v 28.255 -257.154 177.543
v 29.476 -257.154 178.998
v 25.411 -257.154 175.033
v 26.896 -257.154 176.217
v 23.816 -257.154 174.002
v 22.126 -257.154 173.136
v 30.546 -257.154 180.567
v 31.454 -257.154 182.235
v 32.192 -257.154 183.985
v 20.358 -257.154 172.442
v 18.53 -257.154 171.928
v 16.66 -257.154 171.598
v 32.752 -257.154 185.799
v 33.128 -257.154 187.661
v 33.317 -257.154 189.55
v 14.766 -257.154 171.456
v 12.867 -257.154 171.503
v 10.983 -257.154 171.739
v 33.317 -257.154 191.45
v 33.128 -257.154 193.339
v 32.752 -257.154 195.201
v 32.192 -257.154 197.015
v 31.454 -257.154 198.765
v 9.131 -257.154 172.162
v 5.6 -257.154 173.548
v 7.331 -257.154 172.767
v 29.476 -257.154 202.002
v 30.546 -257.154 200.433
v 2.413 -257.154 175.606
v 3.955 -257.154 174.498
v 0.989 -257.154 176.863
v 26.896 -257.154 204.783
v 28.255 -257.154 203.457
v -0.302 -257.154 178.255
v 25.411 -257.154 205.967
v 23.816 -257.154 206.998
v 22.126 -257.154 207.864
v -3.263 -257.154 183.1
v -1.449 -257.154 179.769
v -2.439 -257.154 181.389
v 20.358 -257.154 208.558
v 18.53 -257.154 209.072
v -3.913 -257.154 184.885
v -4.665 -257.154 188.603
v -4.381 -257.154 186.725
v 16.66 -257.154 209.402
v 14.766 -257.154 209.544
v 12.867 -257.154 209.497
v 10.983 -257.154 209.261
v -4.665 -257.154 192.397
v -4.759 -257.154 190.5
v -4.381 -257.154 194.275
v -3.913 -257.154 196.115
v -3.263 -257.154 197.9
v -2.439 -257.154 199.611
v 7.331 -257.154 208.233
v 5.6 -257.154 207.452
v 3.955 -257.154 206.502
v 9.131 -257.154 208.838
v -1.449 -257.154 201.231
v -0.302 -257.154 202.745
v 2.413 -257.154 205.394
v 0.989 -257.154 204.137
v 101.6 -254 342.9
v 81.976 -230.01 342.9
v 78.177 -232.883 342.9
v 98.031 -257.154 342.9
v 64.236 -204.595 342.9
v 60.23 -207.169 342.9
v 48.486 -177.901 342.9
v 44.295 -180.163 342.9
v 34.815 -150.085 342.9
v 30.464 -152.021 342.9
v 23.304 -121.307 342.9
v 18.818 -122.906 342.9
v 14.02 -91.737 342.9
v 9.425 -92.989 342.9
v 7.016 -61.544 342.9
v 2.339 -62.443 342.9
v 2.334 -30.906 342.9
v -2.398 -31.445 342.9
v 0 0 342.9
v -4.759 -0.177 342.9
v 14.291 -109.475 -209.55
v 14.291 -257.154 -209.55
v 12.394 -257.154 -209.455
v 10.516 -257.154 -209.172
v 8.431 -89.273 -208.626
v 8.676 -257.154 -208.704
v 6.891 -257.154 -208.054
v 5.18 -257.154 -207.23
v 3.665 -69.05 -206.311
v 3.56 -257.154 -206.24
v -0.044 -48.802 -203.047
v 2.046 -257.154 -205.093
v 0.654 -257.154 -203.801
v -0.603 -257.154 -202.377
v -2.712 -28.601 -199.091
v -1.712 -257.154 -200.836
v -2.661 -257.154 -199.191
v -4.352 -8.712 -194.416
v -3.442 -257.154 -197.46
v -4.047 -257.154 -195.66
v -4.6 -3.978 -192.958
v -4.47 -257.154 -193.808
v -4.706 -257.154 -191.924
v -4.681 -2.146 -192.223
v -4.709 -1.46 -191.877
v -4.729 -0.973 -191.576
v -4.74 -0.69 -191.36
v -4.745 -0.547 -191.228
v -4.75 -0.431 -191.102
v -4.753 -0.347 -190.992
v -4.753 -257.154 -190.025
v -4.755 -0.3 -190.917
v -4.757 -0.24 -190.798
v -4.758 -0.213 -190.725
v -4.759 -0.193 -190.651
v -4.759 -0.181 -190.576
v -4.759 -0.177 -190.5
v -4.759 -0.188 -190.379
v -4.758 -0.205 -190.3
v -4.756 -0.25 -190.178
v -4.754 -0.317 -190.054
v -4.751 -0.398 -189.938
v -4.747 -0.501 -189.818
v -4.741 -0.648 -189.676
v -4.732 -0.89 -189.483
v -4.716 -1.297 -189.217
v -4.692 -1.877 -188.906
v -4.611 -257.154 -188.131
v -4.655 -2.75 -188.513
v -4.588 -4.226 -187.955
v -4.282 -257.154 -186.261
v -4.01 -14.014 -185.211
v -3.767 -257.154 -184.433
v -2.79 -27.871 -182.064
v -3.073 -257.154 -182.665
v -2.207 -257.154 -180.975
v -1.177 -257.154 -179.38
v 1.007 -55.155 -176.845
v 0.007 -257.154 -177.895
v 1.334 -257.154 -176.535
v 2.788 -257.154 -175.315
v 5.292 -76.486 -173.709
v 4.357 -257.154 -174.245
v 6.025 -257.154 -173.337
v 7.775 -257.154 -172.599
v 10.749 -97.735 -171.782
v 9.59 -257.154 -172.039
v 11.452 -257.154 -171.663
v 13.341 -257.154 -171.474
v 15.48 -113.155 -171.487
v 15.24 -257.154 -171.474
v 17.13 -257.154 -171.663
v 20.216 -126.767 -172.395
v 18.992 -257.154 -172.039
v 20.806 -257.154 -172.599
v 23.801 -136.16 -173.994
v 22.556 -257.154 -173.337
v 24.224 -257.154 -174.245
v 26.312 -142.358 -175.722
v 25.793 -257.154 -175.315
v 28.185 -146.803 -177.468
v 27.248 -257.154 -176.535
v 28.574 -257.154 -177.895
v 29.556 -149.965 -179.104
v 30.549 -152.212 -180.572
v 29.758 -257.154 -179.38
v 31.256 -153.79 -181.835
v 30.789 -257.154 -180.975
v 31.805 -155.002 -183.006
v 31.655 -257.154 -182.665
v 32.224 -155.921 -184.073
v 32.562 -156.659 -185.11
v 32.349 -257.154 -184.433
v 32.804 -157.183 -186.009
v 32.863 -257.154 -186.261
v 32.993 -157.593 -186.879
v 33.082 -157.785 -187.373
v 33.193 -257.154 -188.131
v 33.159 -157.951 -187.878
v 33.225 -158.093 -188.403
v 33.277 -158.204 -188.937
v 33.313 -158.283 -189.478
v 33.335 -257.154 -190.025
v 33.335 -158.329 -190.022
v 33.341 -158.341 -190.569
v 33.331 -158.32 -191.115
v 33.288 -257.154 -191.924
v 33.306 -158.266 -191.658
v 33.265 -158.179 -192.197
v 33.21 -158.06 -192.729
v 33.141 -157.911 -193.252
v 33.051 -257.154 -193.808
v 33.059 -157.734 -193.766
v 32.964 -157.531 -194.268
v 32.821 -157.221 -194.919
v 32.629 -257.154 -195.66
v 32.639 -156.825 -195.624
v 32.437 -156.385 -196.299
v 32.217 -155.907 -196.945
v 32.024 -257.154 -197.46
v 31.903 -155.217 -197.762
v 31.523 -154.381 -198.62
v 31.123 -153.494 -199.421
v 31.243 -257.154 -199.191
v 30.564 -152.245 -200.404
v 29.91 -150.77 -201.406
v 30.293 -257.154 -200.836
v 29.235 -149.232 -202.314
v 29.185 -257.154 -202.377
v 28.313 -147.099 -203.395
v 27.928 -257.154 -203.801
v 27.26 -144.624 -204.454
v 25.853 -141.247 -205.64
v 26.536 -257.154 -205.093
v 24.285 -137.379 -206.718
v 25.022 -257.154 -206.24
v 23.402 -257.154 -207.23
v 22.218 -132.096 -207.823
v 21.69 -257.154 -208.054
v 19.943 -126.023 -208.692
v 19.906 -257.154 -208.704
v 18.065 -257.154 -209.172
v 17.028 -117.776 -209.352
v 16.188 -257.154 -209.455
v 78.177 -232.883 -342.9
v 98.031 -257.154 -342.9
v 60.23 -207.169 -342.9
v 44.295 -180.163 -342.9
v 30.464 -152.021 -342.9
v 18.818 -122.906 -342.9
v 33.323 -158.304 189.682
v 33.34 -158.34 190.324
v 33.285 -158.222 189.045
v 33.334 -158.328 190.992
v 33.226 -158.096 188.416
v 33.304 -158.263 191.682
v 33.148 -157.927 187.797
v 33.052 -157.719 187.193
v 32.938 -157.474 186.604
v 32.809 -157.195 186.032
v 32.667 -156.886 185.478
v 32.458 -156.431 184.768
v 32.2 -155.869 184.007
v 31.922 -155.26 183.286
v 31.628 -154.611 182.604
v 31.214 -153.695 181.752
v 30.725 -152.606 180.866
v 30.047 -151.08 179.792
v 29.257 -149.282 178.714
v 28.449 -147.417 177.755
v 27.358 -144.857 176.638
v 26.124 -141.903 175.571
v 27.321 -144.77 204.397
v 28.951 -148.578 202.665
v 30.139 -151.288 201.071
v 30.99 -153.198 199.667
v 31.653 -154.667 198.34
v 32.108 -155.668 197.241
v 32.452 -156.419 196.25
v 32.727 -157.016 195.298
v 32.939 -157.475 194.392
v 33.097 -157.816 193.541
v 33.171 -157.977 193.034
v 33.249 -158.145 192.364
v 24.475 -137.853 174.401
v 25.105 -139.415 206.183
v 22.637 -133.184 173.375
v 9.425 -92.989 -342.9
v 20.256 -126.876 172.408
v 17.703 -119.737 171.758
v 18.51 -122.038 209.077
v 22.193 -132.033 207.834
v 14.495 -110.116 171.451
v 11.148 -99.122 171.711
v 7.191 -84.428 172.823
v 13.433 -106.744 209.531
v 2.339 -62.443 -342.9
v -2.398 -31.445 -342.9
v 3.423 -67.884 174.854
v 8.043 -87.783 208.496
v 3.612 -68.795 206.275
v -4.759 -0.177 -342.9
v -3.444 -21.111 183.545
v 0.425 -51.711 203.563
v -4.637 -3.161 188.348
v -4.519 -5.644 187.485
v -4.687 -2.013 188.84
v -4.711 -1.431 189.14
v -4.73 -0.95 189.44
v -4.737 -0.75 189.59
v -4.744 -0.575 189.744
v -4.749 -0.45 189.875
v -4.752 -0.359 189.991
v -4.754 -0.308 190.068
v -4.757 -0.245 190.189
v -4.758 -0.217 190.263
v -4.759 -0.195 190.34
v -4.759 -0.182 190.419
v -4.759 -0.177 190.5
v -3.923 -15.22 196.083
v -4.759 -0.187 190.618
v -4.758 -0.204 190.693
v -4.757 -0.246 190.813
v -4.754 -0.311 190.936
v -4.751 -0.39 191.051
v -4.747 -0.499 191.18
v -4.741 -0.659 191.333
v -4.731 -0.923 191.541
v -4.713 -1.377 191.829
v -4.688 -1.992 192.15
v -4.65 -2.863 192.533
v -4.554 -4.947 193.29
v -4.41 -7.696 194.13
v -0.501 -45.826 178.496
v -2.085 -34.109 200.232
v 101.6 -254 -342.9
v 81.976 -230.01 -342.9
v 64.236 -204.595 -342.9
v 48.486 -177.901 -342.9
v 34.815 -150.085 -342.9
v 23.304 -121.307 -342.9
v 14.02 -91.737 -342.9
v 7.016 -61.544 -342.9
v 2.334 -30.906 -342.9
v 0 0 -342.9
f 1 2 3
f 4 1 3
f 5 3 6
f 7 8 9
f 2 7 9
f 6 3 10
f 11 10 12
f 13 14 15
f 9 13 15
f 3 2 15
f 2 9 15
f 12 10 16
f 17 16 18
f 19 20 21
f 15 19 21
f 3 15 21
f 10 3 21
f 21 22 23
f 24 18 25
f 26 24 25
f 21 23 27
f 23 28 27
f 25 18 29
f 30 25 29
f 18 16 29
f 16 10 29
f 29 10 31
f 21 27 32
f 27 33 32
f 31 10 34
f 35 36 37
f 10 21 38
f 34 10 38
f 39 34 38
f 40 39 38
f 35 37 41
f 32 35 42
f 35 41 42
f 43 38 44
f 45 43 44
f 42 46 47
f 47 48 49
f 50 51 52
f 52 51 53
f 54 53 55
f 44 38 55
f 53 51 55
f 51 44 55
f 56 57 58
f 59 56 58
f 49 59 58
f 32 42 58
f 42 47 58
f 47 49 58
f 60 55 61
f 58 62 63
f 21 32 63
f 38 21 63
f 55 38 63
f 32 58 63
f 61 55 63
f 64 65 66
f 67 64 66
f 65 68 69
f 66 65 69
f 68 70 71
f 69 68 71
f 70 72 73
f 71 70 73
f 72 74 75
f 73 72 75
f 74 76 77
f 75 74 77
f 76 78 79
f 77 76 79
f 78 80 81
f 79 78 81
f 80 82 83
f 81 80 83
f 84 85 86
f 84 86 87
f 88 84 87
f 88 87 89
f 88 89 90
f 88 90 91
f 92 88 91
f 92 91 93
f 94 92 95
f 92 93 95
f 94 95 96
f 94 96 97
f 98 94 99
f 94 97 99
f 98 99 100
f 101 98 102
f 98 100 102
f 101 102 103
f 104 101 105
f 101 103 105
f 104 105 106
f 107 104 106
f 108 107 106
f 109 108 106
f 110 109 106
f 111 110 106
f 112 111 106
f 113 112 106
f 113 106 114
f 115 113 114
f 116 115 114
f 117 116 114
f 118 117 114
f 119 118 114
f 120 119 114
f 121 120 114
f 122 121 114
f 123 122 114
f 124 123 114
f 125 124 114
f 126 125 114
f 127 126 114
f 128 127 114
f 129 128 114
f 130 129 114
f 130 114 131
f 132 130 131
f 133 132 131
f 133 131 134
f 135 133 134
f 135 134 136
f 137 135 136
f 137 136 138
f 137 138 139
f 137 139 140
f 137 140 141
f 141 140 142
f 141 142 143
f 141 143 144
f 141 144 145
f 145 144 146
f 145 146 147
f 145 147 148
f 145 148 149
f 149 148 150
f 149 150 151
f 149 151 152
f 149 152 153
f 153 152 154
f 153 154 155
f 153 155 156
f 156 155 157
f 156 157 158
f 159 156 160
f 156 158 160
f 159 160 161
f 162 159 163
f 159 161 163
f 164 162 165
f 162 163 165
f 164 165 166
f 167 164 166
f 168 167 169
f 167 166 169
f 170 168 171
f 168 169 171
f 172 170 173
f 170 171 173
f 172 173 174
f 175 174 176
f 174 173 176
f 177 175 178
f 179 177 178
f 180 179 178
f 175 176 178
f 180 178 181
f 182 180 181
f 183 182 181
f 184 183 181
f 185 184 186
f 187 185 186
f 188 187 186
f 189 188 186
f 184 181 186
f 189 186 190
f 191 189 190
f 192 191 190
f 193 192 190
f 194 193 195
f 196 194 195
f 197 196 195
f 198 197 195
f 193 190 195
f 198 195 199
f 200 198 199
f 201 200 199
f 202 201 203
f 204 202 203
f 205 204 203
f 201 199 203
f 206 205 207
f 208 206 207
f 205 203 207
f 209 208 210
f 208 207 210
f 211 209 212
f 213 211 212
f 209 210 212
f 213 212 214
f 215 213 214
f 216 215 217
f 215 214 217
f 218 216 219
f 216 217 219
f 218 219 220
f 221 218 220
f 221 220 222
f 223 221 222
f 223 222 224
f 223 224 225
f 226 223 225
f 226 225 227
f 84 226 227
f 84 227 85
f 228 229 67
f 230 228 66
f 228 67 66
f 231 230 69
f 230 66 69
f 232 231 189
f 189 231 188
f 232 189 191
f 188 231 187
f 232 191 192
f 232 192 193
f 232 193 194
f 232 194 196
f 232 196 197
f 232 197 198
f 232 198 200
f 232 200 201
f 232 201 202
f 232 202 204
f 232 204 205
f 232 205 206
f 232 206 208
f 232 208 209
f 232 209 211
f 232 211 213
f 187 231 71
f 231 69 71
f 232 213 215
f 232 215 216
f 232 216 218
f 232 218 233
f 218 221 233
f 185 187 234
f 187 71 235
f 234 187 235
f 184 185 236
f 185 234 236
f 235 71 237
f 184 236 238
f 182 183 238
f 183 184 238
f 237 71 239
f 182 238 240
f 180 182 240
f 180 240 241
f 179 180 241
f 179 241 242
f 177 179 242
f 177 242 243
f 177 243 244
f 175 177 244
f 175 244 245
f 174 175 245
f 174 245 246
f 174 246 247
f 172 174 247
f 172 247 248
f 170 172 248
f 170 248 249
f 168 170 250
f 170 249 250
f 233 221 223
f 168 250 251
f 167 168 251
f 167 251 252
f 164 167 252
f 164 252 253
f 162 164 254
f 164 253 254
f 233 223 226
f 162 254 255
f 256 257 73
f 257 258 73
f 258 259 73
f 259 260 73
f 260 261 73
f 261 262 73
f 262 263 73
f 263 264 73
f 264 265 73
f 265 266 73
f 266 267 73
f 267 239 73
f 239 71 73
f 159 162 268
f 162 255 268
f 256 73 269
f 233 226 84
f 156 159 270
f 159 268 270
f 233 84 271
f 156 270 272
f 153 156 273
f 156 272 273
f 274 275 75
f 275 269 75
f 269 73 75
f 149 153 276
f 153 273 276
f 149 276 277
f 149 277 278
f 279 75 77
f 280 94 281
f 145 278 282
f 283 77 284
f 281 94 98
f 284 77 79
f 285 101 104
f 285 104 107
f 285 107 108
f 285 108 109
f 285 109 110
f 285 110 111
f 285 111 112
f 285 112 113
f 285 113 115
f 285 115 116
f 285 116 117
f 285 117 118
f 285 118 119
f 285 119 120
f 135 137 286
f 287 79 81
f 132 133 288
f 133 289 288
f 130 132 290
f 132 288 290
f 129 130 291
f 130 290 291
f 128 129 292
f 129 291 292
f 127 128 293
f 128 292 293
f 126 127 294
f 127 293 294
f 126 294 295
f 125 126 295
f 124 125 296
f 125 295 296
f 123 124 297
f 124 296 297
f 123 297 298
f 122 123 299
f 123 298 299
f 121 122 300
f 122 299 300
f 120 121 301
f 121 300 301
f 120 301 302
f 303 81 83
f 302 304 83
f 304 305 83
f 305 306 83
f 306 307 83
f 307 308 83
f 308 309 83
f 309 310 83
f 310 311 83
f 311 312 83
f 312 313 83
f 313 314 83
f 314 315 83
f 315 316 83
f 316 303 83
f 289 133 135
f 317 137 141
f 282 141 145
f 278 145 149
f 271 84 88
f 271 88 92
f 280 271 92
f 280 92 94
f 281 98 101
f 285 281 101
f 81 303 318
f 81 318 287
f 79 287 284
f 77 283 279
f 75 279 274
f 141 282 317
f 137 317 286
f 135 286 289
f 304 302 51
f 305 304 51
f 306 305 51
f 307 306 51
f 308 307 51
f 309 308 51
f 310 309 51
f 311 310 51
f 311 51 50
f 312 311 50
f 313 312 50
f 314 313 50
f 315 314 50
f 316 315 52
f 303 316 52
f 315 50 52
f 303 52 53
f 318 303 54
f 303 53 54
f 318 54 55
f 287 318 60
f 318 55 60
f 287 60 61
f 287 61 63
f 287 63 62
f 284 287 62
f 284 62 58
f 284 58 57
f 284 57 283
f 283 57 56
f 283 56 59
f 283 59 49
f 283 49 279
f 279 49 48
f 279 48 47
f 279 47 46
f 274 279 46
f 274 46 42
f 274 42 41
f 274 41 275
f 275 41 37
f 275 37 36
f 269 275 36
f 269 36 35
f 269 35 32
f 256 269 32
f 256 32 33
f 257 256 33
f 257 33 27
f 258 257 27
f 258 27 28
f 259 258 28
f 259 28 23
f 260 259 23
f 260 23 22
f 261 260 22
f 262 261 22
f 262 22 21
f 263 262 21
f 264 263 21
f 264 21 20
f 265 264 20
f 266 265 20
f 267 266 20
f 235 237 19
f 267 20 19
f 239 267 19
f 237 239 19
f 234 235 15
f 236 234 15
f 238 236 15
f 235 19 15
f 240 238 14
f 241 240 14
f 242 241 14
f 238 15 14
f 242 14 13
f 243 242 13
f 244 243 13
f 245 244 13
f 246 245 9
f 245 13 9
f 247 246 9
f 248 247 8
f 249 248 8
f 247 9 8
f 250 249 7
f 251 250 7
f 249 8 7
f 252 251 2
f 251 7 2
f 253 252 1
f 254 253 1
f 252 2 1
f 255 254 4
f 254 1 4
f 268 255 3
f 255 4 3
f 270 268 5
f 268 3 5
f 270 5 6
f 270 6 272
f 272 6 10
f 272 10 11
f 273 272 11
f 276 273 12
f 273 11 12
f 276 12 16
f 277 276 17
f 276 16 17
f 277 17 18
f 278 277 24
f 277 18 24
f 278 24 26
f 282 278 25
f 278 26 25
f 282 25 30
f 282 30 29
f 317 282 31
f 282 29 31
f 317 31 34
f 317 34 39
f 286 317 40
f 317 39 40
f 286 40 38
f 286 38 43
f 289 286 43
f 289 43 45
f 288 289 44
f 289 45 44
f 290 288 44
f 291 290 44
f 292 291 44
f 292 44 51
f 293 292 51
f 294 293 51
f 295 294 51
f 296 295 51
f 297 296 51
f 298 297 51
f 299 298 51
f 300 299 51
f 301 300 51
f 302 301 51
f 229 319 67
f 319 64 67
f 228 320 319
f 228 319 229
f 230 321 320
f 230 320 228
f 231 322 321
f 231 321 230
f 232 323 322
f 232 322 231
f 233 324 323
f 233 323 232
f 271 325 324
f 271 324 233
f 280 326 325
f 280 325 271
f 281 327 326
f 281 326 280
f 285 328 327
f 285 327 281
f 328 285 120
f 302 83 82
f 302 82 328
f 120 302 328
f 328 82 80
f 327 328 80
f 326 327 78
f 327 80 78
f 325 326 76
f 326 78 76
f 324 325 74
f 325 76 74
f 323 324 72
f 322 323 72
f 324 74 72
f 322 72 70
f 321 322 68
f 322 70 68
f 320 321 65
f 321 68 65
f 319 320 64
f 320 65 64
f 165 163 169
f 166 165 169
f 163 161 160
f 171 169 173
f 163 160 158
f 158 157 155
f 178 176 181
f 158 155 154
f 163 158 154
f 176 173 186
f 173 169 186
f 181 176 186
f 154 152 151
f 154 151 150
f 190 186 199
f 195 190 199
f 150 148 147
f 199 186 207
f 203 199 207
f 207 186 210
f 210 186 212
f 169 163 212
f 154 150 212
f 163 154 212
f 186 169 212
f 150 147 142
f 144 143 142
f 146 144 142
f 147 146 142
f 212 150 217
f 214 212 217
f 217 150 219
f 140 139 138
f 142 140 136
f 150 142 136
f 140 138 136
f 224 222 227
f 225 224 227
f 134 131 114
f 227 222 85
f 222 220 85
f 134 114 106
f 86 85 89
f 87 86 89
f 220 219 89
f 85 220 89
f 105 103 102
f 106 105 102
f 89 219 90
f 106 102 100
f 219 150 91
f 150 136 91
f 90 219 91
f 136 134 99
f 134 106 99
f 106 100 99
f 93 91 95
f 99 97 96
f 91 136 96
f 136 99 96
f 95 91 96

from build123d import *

# Parameters (mm, degrees)
EXTRUDE_THIN1_DEPTH      = 342.9
BOSS_EXTRUDE3_REACH      = 442.49
BOSS_EXTRUDE3_END_RADIUS = 411.1625
SKETCH8_R                = 19.05


with BuildPart() as part:
    # Sketch1 → Extrude-Thin1 (new, symmetric)
    with BuildSketch(Plane.XY):
        with BuildLine():
            ThreePointArc((0, 0), (28.7854342, -135.80582632), (101.6, -254))
            Line((101.6, -254), (98.031425453, -257.153836069))
            ThreePointArc((98.031425453, -257.153836069), (24.36356396, -137.574574416), (-4.759199547, -0.177273569))
            Line((-4.759199547, -0.177273569), (0, 0))
        make_face()
    extrude(amount=EXTRUDE_THIN1_DEPTH, both=True)

    # Boss-Extrude3: up to this cylinder (the profile starts outside it)
    boss_extrude3_end = Plane(origin=(406.118361376, 15.12734455, 0), z_dir=(0, 0, -1)) * Cylinder(BOSS_EXTRUDE3_END_RADIUS, 2089.305, mode=Mode.PRIVATE)
    # Sketch8 → Boss-Extrude3 (add, up to the surface)
    with BuildSketch(Plane(origin=(0, -257.153836069, 0), x_dir=(1, 0, 0), z_dir=(0, 1, 0)), mode=Mode.PRIVATE) as boss_extrude3_sk1:
        with Locations(Location((14.290800453, -190.5, 0), (0, 0, 180.000000002))):
            Circle(SKETCH8_R)
    boss_extrude3_tool1 = extrude(boss_extrude3_sk1.sketch, amount=BOSS_EXTRUDE3_REACH, mode=Mode.PRIVATE) - boss_extrude3_end
    add(boss_extrude3_tool1.solids().sort_by_distance((14.2908, -257.153836, 190.5))[0])
    # Sketch8 → Boss-Extrude3 (add, up to the surface)
    with BuildSketch(Plane(origin=(0, -257.153836069, 0), x_dir=(1, 0, 0), z_dir=(0, 1, 0)), mode=Mode.PRIVATE) as boss_extrude3_sk2:
        with Locations(Location((14.290800453, 190.5, 0), (0, 0, 90))):
            Circle(SKETCH8_R)
    boss_extrude3_tool2 = extrude(boss_extrude3_sk2.sketch, amount=BOSS_EXTRUDE3_REACH, mode=Mode.PRIVATE) - boss_extrude3_end
    add(boss_extrude3_tool2.solids().sort_by_distance((14.2908, -257.153836, -190.5))[0])


solid = part.part
